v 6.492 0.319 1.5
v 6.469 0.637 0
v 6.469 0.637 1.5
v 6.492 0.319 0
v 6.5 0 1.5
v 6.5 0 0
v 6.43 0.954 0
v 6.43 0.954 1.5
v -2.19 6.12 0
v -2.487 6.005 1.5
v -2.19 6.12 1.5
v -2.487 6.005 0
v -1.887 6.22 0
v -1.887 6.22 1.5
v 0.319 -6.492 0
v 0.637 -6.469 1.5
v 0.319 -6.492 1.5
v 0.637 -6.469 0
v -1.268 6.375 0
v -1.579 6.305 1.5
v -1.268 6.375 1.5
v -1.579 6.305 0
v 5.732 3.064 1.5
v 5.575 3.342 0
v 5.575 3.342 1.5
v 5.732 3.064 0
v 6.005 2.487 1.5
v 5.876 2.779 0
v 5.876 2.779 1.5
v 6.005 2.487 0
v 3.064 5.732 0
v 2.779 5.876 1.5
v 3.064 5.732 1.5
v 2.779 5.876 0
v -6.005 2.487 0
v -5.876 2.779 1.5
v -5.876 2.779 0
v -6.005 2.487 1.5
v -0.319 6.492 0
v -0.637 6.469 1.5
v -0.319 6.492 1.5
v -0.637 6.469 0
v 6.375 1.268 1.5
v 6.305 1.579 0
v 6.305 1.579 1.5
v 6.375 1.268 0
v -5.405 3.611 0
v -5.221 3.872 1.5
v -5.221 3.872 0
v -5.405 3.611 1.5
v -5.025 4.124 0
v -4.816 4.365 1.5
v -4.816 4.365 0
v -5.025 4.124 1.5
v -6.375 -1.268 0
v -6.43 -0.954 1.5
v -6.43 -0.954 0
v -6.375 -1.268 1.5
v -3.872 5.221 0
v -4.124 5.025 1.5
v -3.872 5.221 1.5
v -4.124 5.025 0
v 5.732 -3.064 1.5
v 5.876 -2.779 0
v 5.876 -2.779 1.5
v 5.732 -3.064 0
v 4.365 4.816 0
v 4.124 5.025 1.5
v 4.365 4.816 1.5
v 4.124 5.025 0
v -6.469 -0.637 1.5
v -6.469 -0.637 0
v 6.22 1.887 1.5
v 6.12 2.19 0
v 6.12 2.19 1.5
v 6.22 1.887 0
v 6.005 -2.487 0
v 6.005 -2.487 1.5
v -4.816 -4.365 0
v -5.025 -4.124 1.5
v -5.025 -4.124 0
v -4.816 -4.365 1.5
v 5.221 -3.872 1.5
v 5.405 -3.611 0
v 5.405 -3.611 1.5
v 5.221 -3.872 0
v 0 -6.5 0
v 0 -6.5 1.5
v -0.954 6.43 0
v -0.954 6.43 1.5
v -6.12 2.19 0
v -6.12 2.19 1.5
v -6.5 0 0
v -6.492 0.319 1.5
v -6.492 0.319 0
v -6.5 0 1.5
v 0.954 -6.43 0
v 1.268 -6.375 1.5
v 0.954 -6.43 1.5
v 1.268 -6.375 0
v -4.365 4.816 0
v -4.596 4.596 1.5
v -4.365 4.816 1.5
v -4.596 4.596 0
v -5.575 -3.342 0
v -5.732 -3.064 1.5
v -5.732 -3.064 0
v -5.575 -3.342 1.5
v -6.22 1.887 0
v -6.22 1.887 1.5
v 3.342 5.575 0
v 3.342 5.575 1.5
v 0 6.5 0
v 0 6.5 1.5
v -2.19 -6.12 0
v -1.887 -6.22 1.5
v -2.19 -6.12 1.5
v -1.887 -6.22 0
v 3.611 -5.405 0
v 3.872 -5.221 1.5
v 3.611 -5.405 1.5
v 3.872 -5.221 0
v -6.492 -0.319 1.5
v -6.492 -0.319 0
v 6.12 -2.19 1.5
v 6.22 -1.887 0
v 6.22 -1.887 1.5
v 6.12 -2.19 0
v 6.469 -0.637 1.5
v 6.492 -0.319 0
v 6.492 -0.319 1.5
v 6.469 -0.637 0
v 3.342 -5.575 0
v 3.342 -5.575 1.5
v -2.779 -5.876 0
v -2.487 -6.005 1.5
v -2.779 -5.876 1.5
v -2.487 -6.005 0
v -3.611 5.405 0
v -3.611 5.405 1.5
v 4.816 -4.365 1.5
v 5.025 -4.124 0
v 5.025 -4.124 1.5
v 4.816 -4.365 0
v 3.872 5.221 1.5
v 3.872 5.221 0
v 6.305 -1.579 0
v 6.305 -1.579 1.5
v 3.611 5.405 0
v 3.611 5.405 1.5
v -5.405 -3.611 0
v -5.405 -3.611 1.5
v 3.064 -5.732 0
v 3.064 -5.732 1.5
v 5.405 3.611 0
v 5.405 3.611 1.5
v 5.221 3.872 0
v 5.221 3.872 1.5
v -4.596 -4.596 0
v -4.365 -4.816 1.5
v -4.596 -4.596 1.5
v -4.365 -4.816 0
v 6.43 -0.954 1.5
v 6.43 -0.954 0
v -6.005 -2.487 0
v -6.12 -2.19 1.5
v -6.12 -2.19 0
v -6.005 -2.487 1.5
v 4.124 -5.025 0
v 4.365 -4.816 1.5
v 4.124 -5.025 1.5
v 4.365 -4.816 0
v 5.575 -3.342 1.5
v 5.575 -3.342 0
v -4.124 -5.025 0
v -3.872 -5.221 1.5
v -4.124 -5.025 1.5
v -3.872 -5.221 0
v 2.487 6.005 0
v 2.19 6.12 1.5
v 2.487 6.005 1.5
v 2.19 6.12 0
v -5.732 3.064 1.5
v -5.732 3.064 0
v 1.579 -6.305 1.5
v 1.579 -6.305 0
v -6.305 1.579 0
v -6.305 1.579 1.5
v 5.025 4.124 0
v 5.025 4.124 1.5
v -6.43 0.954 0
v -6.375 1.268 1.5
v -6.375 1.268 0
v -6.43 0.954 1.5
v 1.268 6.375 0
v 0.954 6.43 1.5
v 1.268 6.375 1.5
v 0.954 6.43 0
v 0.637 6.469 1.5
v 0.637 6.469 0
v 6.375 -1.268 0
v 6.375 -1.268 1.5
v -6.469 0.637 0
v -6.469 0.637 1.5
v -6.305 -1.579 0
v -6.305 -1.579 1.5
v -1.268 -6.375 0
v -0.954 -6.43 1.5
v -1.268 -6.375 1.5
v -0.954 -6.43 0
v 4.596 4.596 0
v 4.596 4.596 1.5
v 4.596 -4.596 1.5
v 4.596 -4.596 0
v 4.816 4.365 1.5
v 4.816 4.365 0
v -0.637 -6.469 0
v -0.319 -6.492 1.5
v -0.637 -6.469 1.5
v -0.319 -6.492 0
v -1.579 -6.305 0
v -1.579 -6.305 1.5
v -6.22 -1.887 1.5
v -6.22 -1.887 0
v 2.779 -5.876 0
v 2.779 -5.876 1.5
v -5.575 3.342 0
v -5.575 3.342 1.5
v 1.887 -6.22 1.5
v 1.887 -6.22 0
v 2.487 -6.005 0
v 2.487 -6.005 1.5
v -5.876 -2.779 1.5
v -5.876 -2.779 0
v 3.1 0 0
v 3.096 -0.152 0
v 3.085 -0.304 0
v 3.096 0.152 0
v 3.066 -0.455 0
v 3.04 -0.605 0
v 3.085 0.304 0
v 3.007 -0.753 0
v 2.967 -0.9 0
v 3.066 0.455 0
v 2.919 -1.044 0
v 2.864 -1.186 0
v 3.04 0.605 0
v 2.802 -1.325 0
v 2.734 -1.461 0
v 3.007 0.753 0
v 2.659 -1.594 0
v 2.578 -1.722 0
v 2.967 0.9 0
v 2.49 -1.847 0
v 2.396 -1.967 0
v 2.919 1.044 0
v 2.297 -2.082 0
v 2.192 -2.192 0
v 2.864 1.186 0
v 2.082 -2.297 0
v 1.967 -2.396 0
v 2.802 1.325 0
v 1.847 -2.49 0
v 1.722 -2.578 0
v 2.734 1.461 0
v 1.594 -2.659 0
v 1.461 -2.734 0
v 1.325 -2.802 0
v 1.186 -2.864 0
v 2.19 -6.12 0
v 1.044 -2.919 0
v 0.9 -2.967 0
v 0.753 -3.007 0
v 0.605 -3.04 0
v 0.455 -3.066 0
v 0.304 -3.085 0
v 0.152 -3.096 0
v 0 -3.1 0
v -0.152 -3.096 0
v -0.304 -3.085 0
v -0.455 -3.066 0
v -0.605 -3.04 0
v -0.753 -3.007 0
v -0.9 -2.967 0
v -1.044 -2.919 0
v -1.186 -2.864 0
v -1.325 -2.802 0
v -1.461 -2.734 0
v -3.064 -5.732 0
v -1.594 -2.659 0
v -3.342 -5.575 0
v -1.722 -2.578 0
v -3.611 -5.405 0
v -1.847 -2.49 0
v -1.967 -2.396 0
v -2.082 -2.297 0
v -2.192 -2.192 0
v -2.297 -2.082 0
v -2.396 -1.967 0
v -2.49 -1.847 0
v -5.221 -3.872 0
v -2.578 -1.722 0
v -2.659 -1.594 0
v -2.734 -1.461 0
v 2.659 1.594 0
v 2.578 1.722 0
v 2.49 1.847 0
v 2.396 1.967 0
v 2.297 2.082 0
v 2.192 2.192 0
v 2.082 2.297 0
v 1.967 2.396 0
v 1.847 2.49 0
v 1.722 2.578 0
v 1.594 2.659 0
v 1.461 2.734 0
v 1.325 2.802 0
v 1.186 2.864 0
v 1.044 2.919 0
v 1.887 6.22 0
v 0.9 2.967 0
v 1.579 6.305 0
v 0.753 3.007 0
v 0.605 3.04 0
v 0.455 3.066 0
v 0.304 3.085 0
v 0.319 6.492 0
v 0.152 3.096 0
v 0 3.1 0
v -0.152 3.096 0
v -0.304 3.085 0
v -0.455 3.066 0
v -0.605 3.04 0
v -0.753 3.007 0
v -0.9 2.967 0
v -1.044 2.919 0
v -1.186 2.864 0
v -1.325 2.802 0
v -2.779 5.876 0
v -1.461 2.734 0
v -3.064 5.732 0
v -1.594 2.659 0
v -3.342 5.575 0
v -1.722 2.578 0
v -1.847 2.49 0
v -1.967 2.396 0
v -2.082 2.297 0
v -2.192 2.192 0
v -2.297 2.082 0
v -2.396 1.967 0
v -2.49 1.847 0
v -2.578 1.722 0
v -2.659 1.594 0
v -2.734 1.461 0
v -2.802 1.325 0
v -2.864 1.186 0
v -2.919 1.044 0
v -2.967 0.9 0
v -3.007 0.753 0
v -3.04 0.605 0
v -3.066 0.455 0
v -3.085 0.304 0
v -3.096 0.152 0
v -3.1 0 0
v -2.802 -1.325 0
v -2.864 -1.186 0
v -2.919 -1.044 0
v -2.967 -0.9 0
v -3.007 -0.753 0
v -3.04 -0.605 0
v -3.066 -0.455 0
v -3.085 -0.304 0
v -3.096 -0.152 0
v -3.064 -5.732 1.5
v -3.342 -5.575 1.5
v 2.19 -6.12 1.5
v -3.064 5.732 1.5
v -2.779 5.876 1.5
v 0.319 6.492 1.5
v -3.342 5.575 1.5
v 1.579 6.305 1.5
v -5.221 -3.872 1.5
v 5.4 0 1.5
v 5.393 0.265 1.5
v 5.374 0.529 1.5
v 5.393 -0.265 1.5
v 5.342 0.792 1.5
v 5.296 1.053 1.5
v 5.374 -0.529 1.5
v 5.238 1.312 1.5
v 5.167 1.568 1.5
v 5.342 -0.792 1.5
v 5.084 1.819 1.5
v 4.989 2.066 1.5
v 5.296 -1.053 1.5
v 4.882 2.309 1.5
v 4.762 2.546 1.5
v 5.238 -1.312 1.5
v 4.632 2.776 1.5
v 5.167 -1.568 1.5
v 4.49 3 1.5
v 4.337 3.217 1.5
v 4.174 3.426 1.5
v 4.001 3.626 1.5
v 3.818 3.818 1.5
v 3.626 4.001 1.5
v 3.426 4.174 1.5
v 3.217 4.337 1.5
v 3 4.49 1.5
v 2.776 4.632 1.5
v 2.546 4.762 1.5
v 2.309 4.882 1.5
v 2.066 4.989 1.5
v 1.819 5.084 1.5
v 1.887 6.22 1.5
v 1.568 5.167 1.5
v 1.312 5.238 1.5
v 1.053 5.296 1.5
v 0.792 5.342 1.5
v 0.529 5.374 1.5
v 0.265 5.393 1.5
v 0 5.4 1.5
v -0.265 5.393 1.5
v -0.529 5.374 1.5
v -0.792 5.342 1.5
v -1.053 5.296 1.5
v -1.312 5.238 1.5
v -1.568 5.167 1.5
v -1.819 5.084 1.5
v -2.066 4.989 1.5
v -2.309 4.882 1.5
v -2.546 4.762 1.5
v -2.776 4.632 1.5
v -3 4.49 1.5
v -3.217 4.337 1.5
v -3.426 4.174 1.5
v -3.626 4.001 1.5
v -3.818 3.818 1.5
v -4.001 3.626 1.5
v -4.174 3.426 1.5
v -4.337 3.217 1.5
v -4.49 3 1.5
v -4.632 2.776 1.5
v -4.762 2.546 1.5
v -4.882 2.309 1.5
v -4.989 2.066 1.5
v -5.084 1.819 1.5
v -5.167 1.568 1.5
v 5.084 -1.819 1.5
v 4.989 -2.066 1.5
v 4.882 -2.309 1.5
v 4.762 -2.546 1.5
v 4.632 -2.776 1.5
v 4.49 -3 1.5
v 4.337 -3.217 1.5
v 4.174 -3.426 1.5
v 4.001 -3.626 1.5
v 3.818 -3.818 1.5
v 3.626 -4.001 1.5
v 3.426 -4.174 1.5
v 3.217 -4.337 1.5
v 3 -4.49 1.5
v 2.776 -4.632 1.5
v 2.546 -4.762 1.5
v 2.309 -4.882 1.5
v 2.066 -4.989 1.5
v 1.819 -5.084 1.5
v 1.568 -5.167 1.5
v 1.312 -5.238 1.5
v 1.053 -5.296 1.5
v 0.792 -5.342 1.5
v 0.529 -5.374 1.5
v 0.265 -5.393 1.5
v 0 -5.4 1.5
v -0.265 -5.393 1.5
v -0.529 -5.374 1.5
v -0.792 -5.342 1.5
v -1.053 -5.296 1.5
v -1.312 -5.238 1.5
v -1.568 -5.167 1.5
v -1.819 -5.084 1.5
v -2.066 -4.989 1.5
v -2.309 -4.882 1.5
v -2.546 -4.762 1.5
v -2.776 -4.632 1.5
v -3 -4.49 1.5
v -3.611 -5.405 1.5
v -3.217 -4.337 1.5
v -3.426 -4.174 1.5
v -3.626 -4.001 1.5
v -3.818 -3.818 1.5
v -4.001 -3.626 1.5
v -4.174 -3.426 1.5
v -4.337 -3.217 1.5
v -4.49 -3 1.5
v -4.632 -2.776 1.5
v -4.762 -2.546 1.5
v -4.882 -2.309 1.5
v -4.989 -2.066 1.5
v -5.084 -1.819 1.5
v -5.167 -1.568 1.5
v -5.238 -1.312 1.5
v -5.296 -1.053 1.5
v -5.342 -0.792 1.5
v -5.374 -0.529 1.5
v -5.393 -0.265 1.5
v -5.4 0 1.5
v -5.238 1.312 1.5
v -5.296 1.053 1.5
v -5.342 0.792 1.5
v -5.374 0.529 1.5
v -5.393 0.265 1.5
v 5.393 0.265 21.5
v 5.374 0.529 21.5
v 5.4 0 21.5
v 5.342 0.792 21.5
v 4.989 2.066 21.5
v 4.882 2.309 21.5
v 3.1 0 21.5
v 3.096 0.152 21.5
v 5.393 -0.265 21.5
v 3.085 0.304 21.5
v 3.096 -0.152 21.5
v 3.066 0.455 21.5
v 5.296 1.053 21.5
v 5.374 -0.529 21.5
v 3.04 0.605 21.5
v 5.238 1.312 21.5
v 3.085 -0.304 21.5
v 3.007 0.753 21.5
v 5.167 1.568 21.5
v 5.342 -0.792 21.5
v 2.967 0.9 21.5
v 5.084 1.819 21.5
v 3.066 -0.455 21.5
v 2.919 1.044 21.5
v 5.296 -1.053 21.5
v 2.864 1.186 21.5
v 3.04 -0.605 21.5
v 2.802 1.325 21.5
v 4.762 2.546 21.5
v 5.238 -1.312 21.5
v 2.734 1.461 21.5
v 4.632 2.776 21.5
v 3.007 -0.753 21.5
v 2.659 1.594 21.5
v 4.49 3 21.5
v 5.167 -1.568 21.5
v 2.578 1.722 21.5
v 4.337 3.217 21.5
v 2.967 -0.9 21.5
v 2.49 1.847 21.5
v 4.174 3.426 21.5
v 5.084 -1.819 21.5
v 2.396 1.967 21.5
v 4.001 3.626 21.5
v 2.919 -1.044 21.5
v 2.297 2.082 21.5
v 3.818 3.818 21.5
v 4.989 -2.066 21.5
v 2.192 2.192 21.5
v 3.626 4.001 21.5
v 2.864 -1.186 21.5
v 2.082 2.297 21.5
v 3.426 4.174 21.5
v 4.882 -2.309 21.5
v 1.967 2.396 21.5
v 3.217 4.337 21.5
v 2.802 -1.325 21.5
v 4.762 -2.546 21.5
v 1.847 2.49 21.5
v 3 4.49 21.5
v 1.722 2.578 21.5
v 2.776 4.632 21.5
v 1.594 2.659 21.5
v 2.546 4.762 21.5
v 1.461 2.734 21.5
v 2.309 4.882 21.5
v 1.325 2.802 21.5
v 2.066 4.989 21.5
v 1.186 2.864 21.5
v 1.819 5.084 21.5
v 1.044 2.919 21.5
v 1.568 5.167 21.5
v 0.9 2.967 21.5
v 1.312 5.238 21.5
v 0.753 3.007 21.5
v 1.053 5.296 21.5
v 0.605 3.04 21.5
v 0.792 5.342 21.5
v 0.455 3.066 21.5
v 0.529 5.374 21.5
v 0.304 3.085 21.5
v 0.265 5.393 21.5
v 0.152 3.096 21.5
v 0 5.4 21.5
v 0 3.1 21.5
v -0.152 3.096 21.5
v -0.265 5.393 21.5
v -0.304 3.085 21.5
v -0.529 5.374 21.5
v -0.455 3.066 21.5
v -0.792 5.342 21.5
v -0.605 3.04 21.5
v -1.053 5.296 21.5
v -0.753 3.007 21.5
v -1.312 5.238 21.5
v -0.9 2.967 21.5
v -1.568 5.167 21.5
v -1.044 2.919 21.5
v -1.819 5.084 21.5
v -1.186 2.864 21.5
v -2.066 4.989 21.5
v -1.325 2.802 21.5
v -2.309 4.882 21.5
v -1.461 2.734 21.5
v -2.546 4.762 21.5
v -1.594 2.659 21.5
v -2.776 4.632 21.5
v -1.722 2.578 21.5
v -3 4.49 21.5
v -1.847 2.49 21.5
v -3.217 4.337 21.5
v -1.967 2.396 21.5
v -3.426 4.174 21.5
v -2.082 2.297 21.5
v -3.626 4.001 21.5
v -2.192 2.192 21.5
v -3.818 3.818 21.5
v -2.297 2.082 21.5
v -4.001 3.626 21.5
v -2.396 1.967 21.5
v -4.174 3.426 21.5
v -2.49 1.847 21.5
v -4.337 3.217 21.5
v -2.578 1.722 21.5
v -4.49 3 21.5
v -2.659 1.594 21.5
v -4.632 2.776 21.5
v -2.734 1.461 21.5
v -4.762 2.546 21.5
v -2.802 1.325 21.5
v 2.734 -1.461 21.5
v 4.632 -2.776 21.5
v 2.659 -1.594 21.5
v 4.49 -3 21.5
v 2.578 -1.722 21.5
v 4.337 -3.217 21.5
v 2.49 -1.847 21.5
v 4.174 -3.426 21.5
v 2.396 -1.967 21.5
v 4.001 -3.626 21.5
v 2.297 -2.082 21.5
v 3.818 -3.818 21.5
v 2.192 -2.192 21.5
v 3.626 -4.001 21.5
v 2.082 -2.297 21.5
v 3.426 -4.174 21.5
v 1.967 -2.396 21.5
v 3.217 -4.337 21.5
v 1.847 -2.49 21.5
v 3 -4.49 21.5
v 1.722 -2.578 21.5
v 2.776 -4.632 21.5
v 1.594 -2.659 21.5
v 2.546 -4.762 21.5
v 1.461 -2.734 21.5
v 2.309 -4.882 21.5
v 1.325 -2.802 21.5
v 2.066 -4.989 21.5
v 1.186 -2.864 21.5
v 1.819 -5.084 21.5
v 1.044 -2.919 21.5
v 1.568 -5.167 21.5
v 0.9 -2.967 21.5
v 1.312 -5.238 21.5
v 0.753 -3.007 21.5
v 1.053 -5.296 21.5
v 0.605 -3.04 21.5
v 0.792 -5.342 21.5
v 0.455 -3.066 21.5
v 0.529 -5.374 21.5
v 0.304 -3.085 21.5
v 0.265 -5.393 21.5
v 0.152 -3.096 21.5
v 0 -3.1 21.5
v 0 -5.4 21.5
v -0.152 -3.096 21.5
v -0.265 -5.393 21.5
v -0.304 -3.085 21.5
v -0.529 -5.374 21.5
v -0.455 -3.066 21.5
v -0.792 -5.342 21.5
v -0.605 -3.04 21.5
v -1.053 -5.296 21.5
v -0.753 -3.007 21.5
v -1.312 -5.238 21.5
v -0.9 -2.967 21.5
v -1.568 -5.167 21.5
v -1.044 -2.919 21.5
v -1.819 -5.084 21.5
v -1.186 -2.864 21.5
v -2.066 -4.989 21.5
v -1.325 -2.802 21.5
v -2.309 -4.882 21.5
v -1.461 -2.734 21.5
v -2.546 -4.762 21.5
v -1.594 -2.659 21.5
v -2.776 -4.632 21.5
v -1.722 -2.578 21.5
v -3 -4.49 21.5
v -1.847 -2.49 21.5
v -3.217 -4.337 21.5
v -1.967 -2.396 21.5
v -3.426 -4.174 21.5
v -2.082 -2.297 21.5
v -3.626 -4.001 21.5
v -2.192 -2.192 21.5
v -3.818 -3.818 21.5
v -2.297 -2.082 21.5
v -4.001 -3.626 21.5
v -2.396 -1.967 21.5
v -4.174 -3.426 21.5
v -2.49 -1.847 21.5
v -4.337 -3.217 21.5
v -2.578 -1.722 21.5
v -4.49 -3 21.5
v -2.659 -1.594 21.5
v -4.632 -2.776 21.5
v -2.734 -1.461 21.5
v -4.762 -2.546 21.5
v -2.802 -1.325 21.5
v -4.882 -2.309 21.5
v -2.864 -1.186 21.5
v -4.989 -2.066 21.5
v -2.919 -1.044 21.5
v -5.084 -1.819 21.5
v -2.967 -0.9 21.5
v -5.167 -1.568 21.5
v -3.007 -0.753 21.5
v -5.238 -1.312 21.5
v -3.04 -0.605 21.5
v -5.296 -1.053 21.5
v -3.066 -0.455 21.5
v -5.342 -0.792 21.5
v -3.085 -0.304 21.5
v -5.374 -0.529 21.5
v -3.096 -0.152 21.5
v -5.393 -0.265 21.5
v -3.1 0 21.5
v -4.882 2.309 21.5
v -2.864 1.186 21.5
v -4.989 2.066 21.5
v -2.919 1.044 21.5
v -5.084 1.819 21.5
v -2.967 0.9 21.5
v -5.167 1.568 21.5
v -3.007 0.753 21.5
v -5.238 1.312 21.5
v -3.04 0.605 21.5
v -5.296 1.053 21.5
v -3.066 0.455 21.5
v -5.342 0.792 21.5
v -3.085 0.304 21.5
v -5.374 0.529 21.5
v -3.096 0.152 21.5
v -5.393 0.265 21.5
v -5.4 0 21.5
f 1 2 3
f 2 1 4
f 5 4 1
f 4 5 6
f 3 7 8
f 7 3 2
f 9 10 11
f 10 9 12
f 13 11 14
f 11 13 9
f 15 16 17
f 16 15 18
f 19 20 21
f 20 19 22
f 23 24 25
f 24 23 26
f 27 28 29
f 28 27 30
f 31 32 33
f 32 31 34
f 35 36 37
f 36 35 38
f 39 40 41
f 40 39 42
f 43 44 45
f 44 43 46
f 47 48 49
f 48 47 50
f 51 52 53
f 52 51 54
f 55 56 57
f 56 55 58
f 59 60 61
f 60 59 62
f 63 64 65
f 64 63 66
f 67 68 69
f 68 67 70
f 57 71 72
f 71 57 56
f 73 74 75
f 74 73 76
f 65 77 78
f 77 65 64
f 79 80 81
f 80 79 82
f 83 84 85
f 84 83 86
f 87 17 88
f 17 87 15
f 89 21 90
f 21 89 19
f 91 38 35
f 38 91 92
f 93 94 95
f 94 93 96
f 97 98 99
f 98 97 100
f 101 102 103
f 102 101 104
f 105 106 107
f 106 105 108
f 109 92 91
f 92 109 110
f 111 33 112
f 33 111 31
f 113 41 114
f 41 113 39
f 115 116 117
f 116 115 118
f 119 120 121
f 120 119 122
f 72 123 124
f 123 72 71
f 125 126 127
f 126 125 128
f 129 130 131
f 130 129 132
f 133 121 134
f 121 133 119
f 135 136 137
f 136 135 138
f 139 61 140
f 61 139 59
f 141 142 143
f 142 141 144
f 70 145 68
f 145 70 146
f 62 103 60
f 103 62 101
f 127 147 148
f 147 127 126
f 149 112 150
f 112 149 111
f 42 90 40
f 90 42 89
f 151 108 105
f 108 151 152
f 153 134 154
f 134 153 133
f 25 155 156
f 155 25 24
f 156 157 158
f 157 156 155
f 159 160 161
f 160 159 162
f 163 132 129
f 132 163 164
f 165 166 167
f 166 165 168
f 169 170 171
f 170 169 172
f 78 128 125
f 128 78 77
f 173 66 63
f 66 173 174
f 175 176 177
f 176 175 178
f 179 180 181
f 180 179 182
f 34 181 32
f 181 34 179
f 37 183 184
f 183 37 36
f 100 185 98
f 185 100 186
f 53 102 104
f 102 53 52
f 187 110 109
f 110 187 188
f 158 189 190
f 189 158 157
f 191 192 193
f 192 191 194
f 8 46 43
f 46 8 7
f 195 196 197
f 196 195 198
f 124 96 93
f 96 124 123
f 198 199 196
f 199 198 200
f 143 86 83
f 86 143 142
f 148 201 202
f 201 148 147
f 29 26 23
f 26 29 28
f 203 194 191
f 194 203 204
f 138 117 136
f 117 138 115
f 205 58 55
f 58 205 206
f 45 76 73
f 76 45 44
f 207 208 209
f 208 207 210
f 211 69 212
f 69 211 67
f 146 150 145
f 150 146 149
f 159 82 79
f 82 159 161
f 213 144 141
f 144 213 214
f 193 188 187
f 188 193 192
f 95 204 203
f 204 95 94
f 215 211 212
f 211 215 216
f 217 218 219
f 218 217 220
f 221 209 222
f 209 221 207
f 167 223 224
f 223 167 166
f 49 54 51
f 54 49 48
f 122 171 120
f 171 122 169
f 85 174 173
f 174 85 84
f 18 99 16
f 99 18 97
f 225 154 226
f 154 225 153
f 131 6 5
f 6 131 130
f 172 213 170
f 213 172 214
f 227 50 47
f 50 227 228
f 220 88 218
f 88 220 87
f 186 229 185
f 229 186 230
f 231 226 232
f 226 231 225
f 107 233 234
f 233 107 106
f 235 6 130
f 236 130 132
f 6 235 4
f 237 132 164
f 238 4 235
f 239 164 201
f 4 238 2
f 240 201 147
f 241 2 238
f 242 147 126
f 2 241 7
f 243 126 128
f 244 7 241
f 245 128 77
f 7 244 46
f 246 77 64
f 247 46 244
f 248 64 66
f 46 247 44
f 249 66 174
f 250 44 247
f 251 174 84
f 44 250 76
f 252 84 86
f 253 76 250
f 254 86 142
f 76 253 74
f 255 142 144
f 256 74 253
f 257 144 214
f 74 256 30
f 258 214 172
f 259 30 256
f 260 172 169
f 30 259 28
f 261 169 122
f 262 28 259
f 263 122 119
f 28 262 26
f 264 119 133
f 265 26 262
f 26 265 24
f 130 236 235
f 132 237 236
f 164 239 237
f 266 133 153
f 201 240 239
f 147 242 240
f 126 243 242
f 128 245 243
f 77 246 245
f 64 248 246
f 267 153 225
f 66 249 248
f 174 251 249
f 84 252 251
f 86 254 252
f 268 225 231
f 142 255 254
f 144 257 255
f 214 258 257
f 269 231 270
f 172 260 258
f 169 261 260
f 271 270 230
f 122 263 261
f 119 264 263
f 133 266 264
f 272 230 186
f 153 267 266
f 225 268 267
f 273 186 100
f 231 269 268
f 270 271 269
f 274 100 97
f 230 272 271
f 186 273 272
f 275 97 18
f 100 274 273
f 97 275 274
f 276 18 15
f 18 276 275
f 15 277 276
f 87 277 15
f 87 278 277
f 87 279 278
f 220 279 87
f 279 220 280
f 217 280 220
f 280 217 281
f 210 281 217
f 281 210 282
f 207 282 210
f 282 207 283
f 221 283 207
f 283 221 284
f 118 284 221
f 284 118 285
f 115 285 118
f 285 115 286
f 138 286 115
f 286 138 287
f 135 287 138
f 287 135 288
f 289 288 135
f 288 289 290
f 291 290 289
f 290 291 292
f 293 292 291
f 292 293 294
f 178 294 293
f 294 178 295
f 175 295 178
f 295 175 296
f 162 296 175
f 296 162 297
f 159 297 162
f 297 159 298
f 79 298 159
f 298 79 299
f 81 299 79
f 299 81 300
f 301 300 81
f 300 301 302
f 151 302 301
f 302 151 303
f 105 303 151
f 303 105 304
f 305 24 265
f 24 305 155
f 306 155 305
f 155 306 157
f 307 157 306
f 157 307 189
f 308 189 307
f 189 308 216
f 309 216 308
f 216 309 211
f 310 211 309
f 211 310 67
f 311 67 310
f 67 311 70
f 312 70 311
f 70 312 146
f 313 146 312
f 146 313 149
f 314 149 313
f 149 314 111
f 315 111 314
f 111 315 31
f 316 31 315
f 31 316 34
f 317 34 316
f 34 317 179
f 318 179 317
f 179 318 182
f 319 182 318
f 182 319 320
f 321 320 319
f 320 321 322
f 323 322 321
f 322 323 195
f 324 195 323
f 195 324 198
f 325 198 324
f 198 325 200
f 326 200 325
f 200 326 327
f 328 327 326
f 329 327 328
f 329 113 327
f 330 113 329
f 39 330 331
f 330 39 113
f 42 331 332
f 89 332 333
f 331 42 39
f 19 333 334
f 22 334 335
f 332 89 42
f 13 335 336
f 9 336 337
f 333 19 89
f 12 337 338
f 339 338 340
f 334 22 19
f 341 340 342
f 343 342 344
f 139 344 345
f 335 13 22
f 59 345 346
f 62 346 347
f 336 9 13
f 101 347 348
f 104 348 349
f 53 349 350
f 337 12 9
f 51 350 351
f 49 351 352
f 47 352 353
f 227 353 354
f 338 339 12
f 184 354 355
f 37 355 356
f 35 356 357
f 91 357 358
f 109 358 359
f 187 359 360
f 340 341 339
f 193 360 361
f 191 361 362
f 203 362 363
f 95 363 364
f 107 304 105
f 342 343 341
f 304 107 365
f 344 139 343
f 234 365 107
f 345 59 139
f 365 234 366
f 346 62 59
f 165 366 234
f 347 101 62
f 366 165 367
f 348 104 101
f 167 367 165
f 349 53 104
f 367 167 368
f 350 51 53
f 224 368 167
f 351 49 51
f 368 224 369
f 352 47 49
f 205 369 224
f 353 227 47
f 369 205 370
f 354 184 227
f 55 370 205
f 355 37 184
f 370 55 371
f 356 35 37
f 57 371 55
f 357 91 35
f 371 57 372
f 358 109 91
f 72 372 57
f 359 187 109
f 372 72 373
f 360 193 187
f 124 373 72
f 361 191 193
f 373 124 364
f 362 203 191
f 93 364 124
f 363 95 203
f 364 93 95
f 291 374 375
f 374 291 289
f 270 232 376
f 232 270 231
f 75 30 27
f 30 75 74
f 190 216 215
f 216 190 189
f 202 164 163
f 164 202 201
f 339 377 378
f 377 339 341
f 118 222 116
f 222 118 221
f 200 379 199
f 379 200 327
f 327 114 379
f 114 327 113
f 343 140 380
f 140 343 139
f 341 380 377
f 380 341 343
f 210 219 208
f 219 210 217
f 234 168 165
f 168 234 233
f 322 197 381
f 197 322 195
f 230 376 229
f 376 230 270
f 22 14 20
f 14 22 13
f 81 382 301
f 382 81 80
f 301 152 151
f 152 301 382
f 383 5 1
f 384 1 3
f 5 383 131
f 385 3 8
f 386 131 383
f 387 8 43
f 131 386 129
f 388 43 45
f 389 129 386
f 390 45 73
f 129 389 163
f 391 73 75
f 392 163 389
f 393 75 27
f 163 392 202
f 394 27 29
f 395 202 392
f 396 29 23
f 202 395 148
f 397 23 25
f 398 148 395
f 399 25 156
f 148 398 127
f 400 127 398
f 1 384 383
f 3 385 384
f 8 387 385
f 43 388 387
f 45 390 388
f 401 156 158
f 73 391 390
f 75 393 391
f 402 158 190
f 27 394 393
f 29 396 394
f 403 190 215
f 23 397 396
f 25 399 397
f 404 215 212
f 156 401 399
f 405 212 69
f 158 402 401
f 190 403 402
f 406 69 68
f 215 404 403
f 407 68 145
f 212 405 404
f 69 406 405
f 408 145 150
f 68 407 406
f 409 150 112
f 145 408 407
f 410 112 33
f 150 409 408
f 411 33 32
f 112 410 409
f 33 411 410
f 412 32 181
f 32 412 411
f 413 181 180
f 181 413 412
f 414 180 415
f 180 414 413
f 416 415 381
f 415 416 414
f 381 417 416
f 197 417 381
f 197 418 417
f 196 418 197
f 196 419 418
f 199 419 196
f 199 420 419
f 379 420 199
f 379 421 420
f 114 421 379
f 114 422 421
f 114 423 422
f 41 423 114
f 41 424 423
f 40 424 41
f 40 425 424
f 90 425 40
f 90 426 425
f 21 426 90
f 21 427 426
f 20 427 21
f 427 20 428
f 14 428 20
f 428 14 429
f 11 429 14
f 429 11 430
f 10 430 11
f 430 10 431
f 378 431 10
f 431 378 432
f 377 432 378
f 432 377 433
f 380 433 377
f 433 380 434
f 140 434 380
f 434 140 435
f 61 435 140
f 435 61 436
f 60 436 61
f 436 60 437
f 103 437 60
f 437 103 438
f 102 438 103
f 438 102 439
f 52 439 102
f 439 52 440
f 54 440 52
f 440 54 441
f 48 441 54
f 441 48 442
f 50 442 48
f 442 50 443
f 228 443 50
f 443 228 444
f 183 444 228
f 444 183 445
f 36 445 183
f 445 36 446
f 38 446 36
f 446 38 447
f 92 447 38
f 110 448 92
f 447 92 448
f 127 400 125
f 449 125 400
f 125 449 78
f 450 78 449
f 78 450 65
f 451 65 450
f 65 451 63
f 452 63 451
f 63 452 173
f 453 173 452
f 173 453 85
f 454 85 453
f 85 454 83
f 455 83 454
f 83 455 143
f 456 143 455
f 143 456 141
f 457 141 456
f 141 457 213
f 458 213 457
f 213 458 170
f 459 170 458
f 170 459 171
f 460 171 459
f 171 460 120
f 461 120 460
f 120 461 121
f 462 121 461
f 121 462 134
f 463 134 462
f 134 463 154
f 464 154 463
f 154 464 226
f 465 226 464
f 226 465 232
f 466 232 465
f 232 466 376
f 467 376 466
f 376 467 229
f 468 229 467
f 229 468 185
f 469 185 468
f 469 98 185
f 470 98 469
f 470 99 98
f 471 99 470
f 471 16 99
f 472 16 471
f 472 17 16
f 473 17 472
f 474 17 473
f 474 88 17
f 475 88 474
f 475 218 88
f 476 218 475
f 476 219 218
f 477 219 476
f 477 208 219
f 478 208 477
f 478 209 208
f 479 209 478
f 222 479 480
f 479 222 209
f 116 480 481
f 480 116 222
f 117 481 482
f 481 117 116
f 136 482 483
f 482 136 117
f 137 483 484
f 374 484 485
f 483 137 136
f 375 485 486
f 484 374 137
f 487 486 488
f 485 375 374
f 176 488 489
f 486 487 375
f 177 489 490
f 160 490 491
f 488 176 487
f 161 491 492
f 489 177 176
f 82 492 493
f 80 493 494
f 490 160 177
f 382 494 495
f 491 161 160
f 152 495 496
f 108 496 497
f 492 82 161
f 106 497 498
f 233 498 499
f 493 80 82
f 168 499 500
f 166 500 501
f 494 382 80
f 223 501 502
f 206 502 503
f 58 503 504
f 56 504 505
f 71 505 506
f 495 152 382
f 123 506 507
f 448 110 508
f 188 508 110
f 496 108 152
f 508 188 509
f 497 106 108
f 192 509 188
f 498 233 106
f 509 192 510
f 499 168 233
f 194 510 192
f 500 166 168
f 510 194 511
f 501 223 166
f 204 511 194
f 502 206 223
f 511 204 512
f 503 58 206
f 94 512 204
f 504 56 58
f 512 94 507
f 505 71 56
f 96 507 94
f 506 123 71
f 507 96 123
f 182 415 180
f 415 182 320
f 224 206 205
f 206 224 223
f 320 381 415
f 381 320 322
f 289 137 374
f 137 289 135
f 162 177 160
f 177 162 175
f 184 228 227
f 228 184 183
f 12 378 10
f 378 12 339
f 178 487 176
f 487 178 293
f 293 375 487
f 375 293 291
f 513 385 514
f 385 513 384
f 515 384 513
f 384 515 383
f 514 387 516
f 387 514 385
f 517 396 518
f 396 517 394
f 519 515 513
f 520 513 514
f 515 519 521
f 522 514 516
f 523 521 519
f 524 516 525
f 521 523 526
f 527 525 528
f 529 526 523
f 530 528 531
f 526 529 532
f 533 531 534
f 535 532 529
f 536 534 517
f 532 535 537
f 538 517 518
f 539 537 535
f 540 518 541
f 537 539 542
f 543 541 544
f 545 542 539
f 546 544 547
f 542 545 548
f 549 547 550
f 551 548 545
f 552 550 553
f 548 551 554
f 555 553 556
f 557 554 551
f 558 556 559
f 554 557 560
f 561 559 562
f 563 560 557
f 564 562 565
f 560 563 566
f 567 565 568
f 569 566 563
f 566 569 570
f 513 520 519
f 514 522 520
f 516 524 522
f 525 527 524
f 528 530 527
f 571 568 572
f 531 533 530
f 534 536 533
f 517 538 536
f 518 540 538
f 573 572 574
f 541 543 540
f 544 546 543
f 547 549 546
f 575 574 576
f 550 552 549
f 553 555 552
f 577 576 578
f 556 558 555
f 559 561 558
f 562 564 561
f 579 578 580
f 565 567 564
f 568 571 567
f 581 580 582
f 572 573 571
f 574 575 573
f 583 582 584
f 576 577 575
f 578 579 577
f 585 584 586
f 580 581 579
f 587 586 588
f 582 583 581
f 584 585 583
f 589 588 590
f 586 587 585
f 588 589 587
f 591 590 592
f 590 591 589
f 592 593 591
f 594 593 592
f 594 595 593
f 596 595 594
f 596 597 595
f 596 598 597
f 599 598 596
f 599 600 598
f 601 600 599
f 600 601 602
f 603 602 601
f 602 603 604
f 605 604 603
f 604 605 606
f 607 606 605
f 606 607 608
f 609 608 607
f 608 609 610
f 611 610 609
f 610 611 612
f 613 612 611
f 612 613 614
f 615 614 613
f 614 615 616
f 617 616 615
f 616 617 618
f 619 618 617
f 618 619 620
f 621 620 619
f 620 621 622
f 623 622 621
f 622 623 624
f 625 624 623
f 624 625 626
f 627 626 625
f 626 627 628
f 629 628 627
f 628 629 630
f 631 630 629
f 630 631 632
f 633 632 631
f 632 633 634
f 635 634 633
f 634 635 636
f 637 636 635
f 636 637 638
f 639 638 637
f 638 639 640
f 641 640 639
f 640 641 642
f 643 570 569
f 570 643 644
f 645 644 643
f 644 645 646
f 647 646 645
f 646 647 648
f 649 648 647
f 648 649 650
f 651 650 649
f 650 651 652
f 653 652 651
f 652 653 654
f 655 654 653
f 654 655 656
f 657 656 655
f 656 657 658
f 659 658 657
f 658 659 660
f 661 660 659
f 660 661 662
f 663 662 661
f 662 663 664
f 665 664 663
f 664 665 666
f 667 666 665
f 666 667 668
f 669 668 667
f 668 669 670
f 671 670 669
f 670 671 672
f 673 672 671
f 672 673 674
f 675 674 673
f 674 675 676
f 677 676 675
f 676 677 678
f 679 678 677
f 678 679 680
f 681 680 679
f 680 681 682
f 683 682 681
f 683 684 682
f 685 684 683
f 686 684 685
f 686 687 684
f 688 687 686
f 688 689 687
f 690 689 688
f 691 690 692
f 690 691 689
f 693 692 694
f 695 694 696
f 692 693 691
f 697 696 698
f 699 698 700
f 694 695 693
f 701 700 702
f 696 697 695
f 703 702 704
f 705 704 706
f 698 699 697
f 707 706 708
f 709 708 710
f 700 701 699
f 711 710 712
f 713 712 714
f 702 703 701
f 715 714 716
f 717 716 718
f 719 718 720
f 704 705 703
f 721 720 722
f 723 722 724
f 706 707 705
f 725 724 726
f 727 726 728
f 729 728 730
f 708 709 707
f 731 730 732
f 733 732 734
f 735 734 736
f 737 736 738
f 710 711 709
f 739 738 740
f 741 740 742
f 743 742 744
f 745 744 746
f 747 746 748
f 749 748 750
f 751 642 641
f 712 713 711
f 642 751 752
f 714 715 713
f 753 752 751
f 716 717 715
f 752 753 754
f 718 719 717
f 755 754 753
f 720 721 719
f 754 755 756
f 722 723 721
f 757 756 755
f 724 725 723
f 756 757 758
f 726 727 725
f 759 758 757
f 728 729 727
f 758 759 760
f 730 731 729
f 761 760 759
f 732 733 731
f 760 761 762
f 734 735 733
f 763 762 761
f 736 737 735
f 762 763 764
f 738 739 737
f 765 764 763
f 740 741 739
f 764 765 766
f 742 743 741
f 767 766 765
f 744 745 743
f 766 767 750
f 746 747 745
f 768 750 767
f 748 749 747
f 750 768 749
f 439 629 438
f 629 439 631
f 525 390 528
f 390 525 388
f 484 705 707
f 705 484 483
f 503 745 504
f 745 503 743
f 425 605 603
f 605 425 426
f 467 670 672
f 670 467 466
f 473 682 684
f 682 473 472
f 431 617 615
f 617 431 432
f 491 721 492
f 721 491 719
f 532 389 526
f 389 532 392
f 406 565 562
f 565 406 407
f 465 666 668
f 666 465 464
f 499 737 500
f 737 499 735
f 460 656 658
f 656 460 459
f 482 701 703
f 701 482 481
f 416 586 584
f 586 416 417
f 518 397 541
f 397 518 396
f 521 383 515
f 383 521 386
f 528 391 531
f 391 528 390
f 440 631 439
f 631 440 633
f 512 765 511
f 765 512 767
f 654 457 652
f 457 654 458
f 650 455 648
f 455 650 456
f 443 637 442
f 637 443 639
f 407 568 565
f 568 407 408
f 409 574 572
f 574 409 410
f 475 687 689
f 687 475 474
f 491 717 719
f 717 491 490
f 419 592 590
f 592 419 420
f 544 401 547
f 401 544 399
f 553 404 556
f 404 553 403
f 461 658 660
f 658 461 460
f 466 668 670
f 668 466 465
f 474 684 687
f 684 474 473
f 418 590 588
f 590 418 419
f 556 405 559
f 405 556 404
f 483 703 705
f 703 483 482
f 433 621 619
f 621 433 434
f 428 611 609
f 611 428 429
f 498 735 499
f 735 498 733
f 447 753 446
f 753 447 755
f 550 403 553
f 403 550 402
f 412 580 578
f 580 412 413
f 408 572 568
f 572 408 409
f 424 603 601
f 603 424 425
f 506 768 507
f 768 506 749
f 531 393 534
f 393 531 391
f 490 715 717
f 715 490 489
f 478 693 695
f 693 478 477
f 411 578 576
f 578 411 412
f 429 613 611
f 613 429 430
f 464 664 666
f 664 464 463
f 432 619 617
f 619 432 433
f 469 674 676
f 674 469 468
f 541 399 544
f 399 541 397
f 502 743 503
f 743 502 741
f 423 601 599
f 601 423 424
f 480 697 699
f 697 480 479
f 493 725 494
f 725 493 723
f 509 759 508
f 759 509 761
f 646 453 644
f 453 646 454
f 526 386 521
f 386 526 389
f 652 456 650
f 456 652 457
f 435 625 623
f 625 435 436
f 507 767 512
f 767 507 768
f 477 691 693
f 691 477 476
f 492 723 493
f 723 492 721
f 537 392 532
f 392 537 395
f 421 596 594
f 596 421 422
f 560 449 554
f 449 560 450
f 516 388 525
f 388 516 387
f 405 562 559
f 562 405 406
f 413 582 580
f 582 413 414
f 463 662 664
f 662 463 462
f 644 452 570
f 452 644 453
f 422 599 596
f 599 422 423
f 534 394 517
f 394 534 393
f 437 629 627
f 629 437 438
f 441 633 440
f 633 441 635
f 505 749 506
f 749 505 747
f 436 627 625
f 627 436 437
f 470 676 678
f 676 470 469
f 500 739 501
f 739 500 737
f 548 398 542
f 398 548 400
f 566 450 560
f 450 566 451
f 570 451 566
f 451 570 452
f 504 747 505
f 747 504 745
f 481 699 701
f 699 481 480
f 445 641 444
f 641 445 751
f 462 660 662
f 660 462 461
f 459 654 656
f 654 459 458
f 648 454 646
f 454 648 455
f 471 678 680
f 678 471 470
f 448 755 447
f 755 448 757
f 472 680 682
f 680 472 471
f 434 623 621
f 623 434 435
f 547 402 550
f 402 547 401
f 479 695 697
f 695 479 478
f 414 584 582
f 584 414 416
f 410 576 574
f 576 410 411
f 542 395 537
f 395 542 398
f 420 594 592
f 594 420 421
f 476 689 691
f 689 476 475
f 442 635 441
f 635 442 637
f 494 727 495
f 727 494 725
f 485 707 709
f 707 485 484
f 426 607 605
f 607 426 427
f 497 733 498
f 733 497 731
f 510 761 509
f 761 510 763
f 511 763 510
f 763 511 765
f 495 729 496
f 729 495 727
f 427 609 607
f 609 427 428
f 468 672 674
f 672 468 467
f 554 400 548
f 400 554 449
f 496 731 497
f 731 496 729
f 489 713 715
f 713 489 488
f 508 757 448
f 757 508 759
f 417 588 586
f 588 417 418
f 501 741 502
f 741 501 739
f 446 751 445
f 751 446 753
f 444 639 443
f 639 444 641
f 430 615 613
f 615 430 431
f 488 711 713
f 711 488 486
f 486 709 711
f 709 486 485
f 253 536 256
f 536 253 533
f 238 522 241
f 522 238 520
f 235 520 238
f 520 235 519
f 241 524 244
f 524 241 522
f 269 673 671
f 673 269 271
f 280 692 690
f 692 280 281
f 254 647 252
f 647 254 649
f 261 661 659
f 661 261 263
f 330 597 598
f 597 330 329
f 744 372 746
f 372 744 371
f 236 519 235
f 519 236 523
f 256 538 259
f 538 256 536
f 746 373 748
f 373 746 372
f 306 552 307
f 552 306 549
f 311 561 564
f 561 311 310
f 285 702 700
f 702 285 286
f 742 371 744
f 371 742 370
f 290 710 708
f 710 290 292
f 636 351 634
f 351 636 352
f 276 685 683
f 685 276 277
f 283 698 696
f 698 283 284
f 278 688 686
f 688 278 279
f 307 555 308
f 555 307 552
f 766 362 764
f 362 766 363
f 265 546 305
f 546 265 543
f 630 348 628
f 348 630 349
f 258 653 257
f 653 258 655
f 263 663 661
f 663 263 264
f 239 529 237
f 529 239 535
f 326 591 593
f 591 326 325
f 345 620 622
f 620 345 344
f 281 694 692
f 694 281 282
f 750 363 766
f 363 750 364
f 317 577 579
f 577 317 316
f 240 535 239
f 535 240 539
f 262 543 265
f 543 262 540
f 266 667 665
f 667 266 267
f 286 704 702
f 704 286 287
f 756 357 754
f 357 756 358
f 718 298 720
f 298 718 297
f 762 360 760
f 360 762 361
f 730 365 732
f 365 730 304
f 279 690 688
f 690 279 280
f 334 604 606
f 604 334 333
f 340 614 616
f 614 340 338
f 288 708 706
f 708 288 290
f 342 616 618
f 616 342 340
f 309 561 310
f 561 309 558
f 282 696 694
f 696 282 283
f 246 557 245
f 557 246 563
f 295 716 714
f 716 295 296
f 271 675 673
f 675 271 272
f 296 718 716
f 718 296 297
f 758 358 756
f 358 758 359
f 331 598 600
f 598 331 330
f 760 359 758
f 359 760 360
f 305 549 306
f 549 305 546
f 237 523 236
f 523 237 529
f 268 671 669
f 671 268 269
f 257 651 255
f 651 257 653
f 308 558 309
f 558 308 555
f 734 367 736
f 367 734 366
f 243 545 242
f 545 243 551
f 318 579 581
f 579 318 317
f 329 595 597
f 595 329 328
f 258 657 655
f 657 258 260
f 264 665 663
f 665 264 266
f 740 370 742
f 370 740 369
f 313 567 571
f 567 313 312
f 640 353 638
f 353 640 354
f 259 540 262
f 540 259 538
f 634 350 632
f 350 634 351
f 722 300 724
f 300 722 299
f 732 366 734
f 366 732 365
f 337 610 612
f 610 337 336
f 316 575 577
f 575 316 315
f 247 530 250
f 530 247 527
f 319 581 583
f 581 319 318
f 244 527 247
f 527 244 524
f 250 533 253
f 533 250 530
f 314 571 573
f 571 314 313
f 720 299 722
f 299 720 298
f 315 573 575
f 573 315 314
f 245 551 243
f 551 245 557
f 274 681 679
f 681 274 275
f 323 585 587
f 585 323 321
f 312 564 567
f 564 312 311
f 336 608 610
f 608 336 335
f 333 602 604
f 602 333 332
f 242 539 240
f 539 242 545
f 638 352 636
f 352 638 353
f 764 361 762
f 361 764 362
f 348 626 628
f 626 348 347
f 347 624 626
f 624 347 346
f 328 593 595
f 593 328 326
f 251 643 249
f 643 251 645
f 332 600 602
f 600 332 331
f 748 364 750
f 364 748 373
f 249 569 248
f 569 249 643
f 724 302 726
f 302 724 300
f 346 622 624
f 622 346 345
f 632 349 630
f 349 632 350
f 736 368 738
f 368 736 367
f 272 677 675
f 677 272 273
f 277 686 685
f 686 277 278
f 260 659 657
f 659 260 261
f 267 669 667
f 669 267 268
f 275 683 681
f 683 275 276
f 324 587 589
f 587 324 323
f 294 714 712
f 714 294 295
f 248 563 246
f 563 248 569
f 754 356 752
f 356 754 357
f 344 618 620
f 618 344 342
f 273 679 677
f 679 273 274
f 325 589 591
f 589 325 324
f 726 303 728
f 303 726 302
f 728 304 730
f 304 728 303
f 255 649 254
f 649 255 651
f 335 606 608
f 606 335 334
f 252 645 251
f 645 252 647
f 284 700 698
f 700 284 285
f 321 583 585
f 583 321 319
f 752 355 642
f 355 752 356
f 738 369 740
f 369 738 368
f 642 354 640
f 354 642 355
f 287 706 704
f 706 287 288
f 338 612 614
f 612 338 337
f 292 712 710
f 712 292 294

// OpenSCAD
// Adapter Sleeve for 0.2mL PCR tube in 1.5mL Rack
// Print Orientation: Upside down (Collar on bed)
// Units: mm

// Dimensions
$fn = 128; // High resolution for smooth cylinders

// Collar (Base)
$collar_outer_d = 13;
$collar_thickness = 1.5;

// Sleeve Body
$sleeve_outer_d = 10.8;
$sleeve_total_height = 21.5;

// Bore
$bore_diameter = 6.2;

// Offset for cutting operations (Rule 5)
$cut_offset = 0.1;

// Calculate heights relative to Z=0 (Bed)
// Collar sits from Z=0 to Z=1.5
$collar_z_top = $collar_thickness;

// Sleeve body sits on top of collar, so it starts at Z=1.5
// Total height is 21.5, so body height is 21.5 - 1.5 = 20.0
$sleeve_body_height = $sleeve_total_height - $collar_thickness;
$sleeve_body_z_start = $collar_thickness;
$sleeve_body_z_end = $sleeve_total_height;

// Main Body Construction
// We create the outer shape and subtract the bore in one difference operation
// to ensure the bore goes through both the collar and the sleeve body perfectly.

difference() {
    // 1. Create the Outer Shell
    // The shell consists of the collar (bottom) and the sleeve body (top)
    // We build them as a single union to ensure watertightness
    
    union() {
        // Collar
        cylinder(
            h = $collar_thickness,
            d = $collar_outer_d,
            center = false
        );
        
        // Sleeve Body (placed on top of collar)
        translate([0, 0, $collar_thickness]) {
            cylinder(
                h = $sleeve_body_height,
                d = $sleeve_outer_d,
                center = false
            );
        }
    }
    
    // 2. Subtract the Bore
    // The bore must extend slightly past the top and bottom faces to ensure clean cuts
    translate([0, 0, -$cut_offset]) {
        cylinder(
            h = ($sleeve_total_height + ($cut_offset * 2)),
            d = $bore_diameter,
            center = false
        );
    }
}
